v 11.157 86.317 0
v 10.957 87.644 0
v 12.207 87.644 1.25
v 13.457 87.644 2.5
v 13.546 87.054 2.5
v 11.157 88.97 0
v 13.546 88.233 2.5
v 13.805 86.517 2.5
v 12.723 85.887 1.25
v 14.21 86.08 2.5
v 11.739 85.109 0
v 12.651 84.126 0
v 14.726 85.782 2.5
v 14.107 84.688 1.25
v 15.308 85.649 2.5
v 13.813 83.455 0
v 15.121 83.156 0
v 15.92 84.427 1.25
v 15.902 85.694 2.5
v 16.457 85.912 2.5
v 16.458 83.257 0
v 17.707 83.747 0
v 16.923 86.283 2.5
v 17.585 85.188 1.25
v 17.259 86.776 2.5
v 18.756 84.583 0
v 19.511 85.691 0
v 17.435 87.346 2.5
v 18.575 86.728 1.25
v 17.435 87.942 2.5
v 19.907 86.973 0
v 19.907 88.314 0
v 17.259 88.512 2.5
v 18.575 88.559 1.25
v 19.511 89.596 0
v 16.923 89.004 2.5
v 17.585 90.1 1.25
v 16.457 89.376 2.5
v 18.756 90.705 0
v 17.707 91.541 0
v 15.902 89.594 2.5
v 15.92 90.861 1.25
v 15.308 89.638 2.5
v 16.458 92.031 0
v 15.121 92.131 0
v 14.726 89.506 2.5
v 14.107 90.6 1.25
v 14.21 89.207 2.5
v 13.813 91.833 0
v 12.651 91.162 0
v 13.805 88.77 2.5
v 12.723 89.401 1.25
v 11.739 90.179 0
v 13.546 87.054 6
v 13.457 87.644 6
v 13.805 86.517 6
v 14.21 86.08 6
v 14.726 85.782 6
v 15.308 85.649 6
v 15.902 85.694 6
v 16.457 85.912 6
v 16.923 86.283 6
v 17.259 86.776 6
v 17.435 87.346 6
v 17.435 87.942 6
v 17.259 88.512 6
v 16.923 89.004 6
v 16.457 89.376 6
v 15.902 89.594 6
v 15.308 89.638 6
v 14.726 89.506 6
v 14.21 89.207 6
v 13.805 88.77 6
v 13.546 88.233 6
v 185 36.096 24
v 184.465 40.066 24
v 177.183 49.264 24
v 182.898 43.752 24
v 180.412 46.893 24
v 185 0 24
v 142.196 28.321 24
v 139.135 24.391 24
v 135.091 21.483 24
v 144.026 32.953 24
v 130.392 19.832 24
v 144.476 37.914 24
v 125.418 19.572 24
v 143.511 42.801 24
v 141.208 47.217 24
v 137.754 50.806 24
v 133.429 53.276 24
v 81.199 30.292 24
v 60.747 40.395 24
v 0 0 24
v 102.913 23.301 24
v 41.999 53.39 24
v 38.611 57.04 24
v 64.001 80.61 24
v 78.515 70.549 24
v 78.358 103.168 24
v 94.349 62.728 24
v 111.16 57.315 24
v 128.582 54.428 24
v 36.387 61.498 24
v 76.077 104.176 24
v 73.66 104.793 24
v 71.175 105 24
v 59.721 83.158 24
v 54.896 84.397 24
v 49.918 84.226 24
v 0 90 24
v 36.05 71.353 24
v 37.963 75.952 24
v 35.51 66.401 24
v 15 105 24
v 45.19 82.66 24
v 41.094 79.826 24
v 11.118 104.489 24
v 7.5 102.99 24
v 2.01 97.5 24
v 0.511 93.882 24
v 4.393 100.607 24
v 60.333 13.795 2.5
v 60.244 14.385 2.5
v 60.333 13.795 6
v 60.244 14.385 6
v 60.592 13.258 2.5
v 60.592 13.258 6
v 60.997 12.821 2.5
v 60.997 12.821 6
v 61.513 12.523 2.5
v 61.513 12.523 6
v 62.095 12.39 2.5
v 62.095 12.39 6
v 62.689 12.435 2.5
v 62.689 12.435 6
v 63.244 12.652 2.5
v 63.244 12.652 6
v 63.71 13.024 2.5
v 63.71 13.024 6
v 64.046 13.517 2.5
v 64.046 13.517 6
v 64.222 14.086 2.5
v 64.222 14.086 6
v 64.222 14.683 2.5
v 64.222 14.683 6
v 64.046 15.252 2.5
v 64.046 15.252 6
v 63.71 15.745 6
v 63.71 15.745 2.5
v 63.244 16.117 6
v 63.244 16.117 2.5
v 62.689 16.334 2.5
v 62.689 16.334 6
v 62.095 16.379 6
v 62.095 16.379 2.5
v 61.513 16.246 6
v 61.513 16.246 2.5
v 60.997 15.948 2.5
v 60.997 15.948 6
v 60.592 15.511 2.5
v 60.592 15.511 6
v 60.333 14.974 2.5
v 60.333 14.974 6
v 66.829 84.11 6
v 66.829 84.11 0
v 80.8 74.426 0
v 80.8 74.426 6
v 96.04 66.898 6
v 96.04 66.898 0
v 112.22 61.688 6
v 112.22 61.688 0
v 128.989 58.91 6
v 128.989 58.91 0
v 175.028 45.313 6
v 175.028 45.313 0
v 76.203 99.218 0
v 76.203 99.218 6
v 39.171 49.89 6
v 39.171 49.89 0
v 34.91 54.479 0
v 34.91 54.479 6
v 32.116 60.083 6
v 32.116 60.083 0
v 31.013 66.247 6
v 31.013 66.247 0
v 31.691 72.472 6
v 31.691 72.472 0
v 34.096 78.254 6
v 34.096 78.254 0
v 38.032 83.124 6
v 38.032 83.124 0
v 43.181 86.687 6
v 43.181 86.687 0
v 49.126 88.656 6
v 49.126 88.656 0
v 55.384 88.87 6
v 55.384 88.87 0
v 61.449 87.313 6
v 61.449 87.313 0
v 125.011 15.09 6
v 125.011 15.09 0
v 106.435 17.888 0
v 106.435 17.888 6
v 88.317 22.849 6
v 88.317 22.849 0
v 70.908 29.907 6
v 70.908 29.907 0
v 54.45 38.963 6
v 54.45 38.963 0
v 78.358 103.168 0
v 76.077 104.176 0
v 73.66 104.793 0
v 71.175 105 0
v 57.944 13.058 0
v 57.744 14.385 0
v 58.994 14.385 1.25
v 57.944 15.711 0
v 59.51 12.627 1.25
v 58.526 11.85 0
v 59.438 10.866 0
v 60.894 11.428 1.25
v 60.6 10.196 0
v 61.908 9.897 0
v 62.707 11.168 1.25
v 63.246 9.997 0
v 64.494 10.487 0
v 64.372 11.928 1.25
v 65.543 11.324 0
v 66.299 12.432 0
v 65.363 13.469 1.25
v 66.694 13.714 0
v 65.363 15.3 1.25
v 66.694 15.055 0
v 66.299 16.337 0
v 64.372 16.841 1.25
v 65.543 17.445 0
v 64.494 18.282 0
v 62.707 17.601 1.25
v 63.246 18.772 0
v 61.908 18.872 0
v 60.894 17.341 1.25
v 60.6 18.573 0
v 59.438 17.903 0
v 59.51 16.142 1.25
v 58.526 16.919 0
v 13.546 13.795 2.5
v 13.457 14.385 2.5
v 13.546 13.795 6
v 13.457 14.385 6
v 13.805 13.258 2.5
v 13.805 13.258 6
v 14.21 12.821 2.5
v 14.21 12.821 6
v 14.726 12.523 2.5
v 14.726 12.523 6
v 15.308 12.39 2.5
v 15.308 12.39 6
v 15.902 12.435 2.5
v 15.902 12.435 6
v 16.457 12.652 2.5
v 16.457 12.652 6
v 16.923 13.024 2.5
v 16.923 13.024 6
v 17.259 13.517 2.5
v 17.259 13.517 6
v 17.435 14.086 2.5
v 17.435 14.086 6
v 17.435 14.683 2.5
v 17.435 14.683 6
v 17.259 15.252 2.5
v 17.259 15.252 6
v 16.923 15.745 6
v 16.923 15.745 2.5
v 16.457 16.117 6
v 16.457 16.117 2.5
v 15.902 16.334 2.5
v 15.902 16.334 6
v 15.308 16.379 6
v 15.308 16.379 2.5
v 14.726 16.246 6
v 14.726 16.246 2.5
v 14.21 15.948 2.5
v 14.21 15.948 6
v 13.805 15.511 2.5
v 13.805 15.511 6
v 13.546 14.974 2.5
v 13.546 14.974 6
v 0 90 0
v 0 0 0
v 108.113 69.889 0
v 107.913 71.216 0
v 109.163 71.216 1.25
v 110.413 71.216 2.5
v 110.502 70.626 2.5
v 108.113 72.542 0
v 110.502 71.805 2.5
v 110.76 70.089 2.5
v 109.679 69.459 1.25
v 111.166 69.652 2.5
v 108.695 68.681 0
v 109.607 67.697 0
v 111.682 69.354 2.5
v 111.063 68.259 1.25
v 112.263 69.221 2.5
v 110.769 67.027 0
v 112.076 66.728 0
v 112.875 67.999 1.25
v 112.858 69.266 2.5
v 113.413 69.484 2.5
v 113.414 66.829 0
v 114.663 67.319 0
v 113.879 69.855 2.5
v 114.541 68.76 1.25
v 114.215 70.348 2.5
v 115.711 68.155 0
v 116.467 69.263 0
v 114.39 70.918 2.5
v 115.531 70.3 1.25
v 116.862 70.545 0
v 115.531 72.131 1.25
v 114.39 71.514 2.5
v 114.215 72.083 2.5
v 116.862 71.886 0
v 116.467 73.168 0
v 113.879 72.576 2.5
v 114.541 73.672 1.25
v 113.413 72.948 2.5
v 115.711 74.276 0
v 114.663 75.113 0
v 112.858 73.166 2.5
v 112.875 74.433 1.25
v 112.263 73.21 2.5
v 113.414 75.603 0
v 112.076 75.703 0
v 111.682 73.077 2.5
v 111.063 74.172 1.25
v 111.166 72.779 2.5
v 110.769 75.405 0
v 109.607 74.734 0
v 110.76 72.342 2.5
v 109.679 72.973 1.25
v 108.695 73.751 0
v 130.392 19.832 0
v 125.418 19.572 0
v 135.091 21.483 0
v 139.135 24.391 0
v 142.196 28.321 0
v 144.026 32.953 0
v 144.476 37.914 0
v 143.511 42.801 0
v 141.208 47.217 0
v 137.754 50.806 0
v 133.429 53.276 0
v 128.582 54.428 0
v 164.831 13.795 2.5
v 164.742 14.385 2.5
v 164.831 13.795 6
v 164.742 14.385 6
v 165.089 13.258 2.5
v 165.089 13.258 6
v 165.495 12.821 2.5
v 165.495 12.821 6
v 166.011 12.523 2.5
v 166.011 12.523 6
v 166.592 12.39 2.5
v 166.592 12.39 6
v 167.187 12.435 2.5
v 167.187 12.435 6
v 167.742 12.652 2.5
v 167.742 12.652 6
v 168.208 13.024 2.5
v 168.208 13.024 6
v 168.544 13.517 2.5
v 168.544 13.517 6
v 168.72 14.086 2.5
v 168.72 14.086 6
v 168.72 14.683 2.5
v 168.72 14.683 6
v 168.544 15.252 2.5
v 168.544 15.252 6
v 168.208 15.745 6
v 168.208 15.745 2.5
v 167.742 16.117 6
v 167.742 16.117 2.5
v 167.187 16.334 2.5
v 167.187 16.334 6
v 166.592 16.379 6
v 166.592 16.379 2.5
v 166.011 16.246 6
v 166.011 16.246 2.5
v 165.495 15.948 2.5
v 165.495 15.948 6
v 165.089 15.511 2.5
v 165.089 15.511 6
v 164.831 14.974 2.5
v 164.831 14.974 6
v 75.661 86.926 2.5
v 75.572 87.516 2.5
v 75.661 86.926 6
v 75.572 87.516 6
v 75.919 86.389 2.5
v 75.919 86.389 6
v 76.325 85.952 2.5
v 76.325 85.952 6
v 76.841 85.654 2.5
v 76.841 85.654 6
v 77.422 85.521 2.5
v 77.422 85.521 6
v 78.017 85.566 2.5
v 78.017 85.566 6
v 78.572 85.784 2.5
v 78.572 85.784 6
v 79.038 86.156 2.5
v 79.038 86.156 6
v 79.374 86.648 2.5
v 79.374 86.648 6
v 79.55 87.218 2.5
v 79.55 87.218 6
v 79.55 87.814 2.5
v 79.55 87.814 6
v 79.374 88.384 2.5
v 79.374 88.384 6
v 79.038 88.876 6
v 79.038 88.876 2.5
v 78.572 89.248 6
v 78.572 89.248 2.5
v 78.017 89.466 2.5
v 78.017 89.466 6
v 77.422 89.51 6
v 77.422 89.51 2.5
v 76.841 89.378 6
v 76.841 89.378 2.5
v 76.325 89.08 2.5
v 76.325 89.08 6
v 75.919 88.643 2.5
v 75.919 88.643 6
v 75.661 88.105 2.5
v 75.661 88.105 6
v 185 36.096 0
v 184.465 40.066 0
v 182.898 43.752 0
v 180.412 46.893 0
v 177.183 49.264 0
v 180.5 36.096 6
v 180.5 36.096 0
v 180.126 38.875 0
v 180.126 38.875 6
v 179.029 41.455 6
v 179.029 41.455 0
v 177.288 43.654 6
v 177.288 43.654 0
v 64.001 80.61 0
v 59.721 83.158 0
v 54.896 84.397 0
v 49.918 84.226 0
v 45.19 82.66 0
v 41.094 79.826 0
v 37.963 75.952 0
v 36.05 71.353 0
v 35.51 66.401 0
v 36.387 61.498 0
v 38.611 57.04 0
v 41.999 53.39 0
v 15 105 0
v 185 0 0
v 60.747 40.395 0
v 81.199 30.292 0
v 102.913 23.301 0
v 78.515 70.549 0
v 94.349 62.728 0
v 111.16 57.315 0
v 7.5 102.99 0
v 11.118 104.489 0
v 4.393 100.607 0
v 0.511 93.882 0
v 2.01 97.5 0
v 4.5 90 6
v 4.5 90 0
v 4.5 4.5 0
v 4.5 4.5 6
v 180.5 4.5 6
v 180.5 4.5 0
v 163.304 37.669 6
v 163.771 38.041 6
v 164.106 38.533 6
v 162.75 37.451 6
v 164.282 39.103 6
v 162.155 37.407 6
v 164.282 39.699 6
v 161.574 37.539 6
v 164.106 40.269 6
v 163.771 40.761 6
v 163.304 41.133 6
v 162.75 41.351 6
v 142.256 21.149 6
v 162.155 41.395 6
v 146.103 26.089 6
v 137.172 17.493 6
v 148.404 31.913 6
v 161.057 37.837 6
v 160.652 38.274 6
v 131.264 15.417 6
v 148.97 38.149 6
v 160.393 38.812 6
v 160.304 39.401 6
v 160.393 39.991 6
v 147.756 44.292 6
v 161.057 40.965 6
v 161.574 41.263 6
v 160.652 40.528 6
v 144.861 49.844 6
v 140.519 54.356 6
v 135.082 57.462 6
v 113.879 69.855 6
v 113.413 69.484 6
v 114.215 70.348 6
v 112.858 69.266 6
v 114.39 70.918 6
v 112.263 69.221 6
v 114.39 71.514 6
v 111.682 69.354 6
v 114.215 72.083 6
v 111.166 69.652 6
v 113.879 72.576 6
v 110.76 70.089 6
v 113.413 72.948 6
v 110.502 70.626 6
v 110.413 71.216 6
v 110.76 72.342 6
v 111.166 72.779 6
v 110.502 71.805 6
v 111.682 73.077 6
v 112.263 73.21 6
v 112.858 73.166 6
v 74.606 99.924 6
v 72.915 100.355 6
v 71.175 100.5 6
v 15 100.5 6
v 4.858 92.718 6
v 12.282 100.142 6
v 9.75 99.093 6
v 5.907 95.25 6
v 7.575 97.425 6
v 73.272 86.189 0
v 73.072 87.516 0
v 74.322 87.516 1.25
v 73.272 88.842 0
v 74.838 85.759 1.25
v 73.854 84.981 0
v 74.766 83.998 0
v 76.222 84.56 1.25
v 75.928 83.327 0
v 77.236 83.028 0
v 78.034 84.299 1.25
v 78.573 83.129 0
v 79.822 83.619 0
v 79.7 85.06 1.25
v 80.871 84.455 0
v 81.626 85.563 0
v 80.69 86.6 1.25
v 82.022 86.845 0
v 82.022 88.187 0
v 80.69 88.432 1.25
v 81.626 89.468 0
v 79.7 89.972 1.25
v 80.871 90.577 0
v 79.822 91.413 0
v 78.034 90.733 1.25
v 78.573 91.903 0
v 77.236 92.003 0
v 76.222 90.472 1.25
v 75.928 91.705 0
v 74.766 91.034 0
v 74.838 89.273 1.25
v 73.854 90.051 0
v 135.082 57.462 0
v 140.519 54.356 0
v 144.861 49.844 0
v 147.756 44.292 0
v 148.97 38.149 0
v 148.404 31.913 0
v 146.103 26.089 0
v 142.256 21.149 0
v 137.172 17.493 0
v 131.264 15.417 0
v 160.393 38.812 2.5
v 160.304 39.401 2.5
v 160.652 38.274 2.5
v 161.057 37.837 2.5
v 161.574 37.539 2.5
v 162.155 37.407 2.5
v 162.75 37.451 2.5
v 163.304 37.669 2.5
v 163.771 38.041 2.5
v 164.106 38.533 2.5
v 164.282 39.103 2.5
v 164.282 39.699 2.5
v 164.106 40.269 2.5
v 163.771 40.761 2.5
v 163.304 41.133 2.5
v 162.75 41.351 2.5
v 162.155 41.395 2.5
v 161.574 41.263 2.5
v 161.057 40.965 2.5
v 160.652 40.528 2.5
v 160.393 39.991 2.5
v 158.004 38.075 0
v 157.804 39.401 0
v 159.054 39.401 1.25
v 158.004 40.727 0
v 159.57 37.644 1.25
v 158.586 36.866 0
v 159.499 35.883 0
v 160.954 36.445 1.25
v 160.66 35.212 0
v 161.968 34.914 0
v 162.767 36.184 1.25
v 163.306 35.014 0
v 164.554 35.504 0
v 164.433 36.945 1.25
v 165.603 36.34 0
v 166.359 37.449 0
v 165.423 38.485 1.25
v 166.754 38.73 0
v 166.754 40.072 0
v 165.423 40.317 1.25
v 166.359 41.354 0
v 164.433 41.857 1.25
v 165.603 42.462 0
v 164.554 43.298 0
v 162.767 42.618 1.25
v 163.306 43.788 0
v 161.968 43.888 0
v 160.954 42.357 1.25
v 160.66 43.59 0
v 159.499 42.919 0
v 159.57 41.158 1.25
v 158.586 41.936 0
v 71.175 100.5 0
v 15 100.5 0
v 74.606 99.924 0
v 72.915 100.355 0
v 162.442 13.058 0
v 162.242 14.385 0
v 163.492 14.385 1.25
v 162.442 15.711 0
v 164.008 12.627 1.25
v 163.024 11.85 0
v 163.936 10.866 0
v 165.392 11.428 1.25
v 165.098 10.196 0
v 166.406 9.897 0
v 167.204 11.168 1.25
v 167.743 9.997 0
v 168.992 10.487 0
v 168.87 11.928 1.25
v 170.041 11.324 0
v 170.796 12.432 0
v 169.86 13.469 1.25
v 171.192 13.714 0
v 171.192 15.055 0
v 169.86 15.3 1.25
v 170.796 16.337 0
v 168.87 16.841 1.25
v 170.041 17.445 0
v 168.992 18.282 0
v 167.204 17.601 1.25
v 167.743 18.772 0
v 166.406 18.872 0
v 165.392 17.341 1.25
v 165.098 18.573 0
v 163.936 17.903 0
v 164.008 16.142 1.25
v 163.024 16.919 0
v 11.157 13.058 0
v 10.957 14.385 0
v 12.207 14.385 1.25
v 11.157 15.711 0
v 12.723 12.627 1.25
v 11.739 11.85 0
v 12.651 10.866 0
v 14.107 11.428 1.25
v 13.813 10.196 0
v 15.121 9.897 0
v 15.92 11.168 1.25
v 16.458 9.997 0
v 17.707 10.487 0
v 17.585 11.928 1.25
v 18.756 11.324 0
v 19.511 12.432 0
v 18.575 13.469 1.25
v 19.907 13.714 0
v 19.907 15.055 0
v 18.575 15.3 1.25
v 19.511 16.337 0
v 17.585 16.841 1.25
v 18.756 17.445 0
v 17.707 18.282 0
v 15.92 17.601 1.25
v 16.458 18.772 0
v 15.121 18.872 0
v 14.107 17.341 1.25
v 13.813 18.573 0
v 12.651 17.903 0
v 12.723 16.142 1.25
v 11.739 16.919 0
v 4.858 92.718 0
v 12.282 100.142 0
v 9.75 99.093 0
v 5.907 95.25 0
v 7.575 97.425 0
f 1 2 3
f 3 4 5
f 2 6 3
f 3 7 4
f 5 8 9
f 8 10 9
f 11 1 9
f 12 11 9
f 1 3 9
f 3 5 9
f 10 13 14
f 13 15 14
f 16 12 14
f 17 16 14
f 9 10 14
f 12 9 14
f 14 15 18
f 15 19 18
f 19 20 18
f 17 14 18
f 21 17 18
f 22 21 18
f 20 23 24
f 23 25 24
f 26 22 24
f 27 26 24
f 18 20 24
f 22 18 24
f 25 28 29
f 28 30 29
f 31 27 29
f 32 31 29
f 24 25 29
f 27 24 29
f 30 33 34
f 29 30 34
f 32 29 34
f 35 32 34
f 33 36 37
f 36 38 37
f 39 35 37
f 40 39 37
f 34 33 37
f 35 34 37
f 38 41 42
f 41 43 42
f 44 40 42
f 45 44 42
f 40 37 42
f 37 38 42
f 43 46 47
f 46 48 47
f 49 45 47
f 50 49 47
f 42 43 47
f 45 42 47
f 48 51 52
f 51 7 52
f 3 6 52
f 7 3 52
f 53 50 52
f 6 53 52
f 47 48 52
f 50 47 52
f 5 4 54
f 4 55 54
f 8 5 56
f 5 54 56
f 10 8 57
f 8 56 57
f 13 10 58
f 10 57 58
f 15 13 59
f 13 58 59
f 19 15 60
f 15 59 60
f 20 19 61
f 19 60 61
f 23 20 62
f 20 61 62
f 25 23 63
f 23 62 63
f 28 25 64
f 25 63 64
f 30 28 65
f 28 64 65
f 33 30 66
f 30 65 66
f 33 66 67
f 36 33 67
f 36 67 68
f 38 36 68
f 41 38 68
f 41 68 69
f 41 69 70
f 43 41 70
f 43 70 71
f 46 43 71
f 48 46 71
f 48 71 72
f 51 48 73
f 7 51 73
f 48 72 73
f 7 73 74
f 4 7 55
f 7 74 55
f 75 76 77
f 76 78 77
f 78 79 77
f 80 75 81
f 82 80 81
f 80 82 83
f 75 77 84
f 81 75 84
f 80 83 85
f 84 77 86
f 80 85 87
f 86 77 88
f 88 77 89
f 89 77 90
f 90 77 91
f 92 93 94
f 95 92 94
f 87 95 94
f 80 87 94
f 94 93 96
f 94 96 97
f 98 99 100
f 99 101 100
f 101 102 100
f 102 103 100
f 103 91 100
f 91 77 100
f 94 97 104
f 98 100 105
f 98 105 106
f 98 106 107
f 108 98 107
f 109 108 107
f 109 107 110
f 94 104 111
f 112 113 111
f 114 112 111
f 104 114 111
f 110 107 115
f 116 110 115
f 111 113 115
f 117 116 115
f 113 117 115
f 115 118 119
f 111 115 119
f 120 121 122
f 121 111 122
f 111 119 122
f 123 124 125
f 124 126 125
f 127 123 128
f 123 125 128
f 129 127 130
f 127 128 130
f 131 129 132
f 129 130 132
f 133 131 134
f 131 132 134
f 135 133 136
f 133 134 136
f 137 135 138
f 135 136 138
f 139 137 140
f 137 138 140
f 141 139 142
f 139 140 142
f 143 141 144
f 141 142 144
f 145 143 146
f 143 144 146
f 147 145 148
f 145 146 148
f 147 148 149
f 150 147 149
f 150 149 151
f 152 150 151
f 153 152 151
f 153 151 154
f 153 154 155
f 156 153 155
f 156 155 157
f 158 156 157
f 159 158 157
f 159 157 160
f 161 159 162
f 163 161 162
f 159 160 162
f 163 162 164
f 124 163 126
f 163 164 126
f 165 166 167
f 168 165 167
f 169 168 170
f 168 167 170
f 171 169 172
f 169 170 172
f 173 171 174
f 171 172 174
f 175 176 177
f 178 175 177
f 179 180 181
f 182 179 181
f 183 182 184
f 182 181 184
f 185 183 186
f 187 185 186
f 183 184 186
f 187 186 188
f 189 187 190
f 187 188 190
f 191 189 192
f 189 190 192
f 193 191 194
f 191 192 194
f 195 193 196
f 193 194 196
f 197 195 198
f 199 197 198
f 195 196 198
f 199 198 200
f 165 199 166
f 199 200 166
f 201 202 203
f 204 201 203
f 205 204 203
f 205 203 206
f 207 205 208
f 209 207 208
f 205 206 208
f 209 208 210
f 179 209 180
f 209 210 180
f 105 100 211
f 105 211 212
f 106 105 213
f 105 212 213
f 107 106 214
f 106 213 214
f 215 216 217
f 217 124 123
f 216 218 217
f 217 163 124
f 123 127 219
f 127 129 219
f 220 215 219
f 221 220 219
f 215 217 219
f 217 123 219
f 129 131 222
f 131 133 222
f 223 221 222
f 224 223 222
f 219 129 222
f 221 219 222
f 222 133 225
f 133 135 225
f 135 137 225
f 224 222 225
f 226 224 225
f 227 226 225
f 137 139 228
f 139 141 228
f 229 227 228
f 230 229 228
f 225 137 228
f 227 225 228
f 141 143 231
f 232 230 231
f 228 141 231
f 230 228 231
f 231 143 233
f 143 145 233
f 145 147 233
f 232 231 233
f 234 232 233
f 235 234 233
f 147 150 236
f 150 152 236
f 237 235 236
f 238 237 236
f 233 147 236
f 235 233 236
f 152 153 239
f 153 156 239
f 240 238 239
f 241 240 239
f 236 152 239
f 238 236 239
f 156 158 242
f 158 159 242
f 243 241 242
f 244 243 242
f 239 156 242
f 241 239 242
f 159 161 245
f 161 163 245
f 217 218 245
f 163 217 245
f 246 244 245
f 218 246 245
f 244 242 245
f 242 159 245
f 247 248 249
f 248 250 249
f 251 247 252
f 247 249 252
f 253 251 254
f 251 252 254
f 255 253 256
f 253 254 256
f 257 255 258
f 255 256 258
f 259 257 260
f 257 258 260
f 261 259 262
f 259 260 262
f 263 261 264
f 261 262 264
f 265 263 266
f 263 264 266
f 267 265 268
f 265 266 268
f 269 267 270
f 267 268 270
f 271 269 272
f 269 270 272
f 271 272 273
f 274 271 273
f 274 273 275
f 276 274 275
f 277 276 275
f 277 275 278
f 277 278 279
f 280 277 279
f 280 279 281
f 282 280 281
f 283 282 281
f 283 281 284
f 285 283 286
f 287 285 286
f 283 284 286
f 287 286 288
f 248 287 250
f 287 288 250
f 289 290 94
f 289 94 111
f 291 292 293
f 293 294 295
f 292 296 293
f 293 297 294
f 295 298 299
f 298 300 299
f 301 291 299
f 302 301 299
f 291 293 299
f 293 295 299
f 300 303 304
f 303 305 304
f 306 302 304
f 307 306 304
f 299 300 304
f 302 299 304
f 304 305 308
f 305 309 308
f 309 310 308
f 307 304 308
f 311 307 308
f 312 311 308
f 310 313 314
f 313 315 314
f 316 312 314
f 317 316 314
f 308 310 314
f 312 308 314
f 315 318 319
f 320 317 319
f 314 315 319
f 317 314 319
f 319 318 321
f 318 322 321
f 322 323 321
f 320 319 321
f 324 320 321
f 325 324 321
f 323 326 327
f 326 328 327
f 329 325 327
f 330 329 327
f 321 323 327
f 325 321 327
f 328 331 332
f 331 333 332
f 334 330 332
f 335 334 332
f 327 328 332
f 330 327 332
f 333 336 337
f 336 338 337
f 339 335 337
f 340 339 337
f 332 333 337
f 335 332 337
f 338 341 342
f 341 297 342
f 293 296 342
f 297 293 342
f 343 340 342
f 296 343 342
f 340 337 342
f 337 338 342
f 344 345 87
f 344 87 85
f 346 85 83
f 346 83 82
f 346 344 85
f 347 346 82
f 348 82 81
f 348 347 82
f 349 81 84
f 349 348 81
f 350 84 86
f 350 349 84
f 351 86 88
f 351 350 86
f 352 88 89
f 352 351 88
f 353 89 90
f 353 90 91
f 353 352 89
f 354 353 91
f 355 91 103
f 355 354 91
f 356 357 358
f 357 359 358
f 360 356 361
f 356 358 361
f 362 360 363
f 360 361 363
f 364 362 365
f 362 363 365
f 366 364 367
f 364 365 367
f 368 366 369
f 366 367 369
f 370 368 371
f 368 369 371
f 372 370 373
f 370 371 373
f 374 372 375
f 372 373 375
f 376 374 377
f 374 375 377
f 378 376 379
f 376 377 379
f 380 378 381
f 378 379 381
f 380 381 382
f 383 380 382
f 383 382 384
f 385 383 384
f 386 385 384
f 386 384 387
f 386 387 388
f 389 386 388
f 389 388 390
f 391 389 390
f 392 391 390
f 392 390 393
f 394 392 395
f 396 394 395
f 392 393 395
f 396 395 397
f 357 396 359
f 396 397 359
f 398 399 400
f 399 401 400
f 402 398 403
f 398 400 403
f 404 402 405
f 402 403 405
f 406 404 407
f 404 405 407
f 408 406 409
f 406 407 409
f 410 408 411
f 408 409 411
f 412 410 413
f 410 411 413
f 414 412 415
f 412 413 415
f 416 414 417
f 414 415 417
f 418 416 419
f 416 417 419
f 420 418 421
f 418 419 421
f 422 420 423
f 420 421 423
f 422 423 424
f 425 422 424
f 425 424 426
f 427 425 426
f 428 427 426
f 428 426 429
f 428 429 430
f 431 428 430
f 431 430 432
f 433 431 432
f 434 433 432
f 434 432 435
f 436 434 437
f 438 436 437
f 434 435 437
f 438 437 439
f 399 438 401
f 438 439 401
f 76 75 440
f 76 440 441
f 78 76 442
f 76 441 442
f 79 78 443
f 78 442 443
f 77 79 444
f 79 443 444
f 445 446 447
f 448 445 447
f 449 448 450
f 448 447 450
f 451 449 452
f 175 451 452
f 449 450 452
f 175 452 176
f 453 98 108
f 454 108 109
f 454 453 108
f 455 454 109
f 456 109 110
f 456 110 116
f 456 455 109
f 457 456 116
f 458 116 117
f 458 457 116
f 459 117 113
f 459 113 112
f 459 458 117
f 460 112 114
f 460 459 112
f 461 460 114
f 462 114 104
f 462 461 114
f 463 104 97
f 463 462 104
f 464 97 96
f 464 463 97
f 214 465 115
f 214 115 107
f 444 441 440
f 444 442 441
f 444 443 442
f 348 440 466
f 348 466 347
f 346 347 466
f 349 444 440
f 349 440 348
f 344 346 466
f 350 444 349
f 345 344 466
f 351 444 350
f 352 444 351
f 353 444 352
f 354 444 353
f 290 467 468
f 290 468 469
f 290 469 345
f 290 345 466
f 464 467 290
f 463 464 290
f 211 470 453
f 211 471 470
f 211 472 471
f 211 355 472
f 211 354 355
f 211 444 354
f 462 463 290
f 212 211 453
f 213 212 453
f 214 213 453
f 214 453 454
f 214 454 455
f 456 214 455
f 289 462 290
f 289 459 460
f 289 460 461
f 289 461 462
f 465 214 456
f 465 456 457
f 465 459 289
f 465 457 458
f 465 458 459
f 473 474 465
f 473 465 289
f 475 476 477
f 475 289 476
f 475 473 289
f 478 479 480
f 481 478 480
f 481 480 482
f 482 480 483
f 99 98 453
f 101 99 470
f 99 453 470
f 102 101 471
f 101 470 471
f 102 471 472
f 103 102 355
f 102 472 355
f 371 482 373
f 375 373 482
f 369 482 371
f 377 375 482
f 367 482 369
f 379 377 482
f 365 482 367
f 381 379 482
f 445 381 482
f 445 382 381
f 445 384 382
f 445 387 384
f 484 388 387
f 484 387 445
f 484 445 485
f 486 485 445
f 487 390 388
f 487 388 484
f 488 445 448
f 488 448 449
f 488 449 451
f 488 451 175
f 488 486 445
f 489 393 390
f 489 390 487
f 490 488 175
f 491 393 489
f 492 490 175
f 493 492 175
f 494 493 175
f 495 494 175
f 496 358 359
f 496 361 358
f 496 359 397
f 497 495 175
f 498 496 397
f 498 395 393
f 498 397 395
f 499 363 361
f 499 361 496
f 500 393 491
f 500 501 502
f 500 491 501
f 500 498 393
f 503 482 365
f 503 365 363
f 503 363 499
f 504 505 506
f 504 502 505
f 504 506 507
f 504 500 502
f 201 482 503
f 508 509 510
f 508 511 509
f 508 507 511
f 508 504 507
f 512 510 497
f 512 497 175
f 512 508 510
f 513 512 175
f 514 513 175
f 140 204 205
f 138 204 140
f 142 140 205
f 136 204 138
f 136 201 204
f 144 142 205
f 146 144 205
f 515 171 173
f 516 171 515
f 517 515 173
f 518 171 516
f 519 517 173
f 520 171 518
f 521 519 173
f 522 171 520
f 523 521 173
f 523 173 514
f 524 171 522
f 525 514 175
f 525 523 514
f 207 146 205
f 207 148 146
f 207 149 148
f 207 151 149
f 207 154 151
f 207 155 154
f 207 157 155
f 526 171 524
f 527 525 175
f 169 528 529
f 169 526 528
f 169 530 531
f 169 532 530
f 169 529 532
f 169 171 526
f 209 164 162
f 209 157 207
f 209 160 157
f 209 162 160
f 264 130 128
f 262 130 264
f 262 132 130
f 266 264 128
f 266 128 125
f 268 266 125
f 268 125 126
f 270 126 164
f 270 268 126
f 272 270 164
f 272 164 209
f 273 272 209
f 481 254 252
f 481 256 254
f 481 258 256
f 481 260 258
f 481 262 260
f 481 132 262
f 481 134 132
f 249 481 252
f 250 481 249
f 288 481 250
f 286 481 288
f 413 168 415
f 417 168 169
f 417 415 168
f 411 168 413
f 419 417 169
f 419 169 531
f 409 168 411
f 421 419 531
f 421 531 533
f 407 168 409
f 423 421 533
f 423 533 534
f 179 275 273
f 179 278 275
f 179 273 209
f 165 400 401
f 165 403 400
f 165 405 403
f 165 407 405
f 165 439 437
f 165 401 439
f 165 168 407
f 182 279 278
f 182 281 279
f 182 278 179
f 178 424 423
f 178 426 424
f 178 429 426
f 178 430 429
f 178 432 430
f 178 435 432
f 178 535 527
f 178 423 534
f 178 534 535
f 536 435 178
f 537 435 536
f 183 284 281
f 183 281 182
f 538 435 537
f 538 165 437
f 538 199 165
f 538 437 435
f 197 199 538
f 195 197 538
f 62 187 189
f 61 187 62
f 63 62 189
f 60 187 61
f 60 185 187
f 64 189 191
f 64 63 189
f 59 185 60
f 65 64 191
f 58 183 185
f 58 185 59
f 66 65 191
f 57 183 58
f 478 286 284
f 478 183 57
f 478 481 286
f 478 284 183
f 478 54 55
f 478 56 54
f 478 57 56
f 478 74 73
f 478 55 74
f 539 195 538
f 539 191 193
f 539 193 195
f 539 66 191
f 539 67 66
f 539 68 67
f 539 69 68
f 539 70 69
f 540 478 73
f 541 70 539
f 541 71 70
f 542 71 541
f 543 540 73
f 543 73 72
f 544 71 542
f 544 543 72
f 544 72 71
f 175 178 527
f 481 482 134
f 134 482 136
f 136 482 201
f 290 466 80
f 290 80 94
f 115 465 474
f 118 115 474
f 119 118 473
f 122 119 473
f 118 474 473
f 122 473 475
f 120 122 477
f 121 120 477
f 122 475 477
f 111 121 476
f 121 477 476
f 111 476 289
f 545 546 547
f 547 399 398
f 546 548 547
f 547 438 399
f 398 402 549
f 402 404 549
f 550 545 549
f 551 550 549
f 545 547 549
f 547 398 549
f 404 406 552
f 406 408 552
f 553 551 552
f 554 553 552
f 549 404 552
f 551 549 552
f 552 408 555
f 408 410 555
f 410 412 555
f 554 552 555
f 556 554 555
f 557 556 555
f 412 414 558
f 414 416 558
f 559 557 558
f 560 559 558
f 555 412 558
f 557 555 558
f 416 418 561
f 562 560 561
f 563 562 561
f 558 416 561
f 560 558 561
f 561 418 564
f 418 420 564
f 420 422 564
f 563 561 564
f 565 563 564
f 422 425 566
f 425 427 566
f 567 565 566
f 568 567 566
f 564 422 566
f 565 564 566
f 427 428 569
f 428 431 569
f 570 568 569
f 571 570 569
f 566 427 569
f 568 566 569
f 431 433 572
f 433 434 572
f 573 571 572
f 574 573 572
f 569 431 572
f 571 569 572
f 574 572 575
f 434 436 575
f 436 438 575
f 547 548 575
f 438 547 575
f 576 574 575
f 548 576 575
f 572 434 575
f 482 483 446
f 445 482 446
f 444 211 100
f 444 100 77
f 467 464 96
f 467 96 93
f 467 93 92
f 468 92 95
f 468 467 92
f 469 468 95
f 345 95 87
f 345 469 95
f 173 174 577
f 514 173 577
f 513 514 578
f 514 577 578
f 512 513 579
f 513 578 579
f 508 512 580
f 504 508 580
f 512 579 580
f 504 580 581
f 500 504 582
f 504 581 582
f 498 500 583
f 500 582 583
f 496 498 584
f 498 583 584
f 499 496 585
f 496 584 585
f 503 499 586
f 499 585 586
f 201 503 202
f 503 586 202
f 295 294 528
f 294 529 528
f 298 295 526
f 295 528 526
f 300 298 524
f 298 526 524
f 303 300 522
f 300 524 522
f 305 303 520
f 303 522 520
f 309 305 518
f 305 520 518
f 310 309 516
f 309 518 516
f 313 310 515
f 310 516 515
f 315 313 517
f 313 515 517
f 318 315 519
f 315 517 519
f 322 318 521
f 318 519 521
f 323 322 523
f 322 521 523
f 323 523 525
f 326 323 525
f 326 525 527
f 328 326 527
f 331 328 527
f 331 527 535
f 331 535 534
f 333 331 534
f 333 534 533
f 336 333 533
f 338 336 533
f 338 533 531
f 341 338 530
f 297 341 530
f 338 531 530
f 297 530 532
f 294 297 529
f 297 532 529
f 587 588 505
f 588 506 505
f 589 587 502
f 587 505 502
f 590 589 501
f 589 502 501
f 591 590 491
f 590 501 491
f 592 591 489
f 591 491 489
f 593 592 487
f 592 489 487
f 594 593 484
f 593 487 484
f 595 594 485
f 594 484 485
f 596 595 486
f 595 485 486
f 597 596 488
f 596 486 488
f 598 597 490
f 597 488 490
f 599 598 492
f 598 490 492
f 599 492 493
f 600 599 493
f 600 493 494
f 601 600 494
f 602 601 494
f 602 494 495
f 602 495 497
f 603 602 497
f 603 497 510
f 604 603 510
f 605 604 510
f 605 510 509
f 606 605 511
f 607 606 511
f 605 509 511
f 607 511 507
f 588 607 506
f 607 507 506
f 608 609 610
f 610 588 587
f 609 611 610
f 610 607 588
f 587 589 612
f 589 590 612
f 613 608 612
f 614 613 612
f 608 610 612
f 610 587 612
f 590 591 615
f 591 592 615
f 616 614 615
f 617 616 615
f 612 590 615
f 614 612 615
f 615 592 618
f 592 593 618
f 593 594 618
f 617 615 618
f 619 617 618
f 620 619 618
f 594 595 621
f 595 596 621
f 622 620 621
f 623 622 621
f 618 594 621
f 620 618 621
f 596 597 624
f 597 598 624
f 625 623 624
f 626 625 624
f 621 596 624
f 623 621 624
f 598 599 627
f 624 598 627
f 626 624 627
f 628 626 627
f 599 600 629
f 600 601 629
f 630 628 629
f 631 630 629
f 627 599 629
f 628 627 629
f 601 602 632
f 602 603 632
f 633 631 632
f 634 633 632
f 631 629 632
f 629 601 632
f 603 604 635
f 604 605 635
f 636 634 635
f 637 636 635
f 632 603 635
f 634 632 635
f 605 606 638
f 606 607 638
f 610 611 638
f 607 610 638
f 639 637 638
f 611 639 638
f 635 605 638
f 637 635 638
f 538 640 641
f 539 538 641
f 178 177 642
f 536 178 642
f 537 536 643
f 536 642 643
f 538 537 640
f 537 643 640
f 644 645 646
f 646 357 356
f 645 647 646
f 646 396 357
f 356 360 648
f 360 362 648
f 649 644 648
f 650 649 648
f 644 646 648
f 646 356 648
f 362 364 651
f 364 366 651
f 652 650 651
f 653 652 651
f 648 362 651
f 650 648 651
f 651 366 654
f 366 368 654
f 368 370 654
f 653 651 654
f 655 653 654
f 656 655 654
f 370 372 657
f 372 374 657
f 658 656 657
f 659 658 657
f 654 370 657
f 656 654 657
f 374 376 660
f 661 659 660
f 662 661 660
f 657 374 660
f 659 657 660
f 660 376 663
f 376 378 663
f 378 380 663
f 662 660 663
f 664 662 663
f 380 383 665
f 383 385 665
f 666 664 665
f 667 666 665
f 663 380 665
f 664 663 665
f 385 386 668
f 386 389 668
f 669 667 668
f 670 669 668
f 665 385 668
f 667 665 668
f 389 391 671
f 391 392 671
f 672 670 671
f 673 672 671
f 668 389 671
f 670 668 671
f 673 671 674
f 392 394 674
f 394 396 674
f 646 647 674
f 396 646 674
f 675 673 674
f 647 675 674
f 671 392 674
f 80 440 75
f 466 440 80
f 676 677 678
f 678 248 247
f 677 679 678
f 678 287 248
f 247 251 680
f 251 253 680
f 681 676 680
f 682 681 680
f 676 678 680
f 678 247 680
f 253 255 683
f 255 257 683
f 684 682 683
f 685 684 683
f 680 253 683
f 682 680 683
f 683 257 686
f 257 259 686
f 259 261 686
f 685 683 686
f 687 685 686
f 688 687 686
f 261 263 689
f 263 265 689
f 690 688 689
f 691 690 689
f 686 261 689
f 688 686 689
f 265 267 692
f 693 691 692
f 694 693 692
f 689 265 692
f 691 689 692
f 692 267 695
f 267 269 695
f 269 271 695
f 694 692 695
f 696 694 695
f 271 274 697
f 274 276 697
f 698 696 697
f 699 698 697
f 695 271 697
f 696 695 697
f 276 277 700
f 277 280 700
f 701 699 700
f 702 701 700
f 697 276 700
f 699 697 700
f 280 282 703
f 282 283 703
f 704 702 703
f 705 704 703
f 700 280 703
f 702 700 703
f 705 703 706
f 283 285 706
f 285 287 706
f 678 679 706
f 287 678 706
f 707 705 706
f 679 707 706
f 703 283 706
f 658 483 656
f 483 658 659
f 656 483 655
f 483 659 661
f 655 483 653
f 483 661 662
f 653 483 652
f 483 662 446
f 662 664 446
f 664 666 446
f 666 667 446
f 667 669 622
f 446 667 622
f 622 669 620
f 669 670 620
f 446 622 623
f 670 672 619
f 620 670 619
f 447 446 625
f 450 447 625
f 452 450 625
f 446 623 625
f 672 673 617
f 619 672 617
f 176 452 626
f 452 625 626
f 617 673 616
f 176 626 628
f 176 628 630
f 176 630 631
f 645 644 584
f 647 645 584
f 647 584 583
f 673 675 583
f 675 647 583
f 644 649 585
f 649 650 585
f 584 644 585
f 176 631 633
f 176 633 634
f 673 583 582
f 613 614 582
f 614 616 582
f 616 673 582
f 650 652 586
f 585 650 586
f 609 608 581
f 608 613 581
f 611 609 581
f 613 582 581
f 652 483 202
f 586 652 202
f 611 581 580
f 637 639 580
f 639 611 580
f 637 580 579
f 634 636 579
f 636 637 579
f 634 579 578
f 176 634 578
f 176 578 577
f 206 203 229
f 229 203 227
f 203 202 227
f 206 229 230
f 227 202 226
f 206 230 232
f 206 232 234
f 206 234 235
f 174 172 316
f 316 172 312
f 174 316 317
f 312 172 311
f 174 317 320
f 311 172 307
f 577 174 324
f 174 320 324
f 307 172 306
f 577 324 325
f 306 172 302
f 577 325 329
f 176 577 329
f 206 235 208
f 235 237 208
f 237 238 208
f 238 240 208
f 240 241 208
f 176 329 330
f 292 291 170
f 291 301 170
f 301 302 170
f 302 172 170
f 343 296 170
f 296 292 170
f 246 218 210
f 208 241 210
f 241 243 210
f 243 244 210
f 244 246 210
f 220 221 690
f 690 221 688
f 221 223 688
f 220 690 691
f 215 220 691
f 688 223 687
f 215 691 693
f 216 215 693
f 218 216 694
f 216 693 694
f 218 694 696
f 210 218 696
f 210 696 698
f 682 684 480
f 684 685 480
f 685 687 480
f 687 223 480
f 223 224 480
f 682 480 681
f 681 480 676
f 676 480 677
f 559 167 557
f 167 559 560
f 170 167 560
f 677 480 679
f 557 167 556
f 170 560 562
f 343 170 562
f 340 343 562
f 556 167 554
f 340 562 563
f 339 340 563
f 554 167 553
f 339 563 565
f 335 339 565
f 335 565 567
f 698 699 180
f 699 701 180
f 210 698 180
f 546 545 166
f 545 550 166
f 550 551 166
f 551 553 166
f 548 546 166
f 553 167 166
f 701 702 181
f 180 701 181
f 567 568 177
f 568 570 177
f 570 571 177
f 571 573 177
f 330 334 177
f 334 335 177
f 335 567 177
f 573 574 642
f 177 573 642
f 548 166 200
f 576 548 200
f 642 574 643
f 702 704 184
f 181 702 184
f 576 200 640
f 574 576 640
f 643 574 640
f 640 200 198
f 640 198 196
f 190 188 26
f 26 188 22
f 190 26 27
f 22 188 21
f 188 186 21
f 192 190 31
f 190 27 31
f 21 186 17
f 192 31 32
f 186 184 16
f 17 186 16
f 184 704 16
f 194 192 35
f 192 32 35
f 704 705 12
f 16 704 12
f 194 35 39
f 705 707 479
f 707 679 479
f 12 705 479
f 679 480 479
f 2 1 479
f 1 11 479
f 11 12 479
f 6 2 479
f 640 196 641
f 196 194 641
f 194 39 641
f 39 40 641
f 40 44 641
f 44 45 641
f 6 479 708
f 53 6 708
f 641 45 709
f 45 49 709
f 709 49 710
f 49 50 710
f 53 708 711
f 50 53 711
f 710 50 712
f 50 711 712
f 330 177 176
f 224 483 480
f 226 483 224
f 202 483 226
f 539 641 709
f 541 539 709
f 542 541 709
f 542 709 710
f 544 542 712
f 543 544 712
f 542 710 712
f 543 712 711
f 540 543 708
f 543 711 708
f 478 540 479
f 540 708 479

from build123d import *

# Parameters (mm, degrees)
PAD_DEPTH        = 24
PAD001_DEPTH     = 6
HOLE_D           = 4
HOLE_DEPTH       = 25
HOLE_CSINK_D     = 9
HOLE_CSINK_ANGLE = 90


with BuildPart() as handlebody:
    # Sketch → Pad (new body)
    with BuildSketch(Plane.XY):
        with BuildLine():
            Line((0, 0), (0, 90))
            ThreePointArc((15, 105), (4.393398, 100.606602), (0, 90))
            Line((15, 105), (71.17509, 105))
            ThreePointArc((78.357872, 103.168434), (74.881402, 104.534898), (71.17509, 105))
            Line((78.357872, 103.168434), (177.182782, 49.263937))
            ThreePointArc((185, 36.095504), (182.898483, 43.75247), (177.182782, 49.263937))
            Line((185, 36.095504), (185, 0))
            Line((185, 0), (0, 0))
        make_face()
        with BuildLine():
            ThreePointArc((64.000663, 80.610121), (39.389879, 78.000663), (41.999337, 53.389879))
            ThreePointArc((41.999337, 53.389879), (81.199492, 30.292081), (125.417518, 19.571697))
            ThreePointArc((125.417518, 19.571697), (144.428303, 35.417518), (128.582482, 54.428303))
            ThreePointArc((64.000663, 80.610121), (94.349171, 62.727956), (128.582482, 54.428303))
        make_face(mode=Mode.SUBTRACT)
    extrude(amount=PAD_DEPTH)


with BuildPart() as handletemplate:
    # Binder001 → Pad001 (new body)
    with BuildSketch(Plane(origin=(75.99654, 43.948371, 0), x_dir=(0, 1, 0), z_dir=(0, 0, 1))):
        with BuildLine():
            Line((-39.448371, -104.50346), (-7.852867, -104.50346))
            ThreePointArc((-7.852867, -104.50346), (-2.492991, -103.032398), (1.365036, -99.031408))
            Line((1.365036, -99.031408), (55.269533, -0.206497))
            ThreePointArc((55.269533, -0.206497), (56.226058, 2.227032), (56.551629, 4.82145))
            Line((56.551629, 4.82145), (56.551629, 60.99654))
            ThreePointArc((56.551629, 60.99654), (53.476251, 68.421161), (46.051629, 71.49654))
            Line((46.051629, 71.49654), (-39.448371, 71.49654))
            Line((-39.448371, 71.49654), (-39.448371, -104.50346))
        make_face()
        with BuildLine():
            ThreePointArc((40.161496, 9.167134), (22.949912, -20.043304), (14.961496, -52.992866))
            ThreePointArc((14.961496, -52.992866), (-8.937776, -72.913327), (-28.858238, -49.014055))
            ThreePointArc((-28.858238, -49.014055), (-17.826616, -3.51228), (5.941762, 36.825945))
            ThreePointArc((5.941762, 36.825945), (36.881035, 40.106407), (40.161496, 9.167134))
        make_face(mode=Mode.SUBTRACT)
    extrude(amount=PAD001_DEPTH)

    # Hole
    with Locations(Plane(origin=(0, 0, 0), x_dir=(1, 0, 0), z_dir=(0, 0, -1))):
        with Locations((15.457089, -14.384521), (166.741847, -14.384521), (112.412661, -71.215702), (15.457089, -87.643808), (62.244171, -14.384521), (162.304459, -39.401062), (77.57196, -87.515877)):
            CounterSinkHole(HOLE_D / 2, HOLE_CSINK_D / 2, depth=HOLE_DEPTH, counter_sink_angle=HOLE_CSINK_ANGLE)


solid = Compound([handlebody.part, handletemplate.part])
